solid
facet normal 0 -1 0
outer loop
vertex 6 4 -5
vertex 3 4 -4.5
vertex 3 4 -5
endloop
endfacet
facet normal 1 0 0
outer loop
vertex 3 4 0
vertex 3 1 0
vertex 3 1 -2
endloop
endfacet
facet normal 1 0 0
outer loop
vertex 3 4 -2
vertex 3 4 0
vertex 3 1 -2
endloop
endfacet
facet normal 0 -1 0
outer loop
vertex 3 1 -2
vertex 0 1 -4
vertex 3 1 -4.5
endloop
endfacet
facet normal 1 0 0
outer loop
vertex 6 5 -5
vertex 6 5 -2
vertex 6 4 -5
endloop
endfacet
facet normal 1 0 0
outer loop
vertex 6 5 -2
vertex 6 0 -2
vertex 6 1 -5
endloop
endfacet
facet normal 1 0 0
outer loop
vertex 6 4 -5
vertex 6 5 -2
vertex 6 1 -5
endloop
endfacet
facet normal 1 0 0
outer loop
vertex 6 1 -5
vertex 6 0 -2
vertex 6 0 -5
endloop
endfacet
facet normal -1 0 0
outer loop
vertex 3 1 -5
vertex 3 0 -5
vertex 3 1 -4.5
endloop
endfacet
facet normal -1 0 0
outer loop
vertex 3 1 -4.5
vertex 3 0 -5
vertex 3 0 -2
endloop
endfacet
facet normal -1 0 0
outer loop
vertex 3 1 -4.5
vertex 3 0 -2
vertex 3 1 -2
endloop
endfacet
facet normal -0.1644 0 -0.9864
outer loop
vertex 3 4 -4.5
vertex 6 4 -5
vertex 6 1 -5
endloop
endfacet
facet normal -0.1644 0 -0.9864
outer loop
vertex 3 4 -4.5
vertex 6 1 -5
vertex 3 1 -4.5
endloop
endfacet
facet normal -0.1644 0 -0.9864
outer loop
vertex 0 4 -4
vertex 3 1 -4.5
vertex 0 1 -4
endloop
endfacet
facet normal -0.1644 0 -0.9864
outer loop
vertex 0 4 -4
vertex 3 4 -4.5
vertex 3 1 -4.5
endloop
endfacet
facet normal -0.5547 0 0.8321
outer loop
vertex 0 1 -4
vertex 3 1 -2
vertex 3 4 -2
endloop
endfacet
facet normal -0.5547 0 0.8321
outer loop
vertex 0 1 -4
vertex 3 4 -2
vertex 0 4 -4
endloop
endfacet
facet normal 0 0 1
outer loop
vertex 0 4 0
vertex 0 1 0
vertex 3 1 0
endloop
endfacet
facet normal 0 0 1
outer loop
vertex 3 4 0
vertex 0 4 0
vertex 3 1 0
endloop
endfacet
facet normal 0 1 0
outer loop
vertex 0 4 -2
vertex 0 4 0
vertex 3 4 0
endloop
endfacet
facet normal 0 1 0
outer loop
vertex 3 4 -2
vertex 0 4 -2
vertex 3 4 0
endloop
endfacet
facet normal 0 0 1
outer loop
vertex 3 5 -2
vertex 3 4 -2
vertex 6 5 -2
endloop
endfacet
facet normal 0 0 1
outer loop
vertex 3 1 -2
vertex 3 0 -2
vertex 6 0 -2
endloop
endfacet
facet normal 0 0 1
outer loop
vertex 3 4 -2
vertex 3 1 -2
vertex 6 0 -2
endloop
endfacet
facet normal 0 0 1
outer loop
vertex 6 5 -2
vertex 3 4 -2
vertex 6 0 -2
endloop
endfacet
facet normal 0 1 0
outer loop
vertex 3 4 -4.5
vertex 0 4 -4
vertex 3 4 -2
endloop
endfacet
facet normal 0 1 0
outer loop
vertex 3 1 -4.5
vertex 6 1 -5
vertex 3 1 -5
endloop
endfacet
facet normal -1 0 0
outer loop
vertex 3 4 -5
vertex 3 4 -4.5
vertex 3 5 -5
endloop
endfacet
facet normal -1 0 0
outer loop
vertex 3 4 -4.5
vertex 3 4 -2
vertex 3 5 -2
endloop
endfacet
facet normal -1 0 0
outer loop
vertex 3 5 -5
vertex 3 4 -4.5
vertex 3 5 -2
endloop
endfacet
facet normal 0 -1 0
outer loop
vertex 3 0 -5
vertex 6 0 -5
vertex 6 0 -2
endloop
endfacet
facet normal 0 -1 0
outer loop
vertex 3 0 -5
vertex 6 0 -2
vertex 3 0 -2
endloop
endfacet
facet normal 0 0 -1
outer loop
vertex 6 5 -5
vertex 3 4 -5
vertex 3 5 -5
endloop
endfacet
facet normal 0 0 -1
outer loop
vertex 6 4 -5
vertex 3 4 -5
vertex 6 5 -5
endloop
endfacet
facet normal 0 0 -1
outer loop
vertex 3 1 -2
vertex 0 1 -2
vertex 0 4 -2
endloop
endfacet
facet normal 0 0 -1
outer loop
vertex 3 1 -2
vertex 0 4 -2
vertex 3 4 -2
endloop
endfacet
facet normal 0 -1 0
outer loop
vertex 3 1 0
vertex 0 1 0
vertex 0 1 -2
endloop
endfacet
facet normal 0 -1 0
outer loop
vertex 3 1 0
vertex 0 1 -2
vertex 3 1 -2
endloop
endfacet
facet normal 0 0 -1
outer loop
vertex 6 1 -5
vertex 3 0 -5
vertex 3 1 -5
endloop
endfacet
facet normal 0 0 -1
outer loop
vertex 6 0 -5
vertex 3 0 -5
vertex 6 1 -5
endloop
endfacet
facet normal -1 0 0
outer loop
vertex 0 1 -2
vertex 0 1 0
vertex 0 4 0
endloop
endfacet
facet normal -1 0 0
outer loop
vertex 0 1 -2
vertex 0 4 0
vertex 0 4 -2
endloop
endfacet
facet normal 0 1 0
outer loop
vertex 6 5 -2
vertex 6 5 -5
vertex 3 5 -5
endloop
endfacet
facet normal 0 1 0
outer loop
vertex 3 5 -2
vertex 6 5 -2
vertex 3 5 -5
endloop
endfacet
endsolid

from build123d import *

# Parameters (mm, degrees)
SKETCH1_W           = 3
SKETCH1_H           = 2
SKETCH1_H_2         = 3
BOSS_EXTRUDE3_DEPTH = 5
SKETCH3_W           = 3
SKETCH3_H           = 1
CUT_EXTRUDE2_DEPTH  = 5
CUT_EXTRUDE3_DEPTH  = 5


with BuildPart() as part:
    # Sketch1 → Boss-Extrude3 (new body)
    with BuildSketch(Plane(origin=(0, 0, 0), x_dir=(1, 0, 0), z_dir=(0, 1, 0))):
        with Locations((1.5, 1)):
            Rectangle(SKETCH1_W, SKETCH1_H)
        Polygon((0, 4), (3, 5), (3, 2), align=None)
        with Locations((4.5, 3.5)):
            Rectangle(SKETCH1_W, SKETCH1_H_2)
    extrude(amount=BOSS_EXTRUDE3_DEPTH)

    # Sketch3 → Cut-Extrude2 (cut)
    with BuildSketch(Plane.XY):
        with Locations((1.5, 4.5)):
            Rectangle(SKETCH3_W, SKETCH3_H)
        with Locations((1.5, 0.5)):
            Rectangle(SKETCH3_W, SKETCH3_H)
    extrude(amount=-CUT_EXTRUDE2_DEPTH, mode=Mode.SUBTRACT)

    # 3DSketch1 → Cut-Extrude3 (cut, along a direction that is not the sketch's normal)
    with BuildSketch(Plane(origin=(0, 4, -4), x_dir=(0.8846517369293828, -0.4423258684646914, -0.14744195615489727), z_dir=(0.16439898730535743, 0, 0.9863939238321437))):
        Polygon((0, 0), (5.455352378, 2.690563219), (6.782329983, 0), (1.326977605, -2.690563219), align=None)
    extrude(amount=-CUT_EXTRUDE3_DEPTH, dir=(0.31622776601683794, 0, 0.9486832980505139), mode=Mode.SUBTRACT)


solid = part.part
